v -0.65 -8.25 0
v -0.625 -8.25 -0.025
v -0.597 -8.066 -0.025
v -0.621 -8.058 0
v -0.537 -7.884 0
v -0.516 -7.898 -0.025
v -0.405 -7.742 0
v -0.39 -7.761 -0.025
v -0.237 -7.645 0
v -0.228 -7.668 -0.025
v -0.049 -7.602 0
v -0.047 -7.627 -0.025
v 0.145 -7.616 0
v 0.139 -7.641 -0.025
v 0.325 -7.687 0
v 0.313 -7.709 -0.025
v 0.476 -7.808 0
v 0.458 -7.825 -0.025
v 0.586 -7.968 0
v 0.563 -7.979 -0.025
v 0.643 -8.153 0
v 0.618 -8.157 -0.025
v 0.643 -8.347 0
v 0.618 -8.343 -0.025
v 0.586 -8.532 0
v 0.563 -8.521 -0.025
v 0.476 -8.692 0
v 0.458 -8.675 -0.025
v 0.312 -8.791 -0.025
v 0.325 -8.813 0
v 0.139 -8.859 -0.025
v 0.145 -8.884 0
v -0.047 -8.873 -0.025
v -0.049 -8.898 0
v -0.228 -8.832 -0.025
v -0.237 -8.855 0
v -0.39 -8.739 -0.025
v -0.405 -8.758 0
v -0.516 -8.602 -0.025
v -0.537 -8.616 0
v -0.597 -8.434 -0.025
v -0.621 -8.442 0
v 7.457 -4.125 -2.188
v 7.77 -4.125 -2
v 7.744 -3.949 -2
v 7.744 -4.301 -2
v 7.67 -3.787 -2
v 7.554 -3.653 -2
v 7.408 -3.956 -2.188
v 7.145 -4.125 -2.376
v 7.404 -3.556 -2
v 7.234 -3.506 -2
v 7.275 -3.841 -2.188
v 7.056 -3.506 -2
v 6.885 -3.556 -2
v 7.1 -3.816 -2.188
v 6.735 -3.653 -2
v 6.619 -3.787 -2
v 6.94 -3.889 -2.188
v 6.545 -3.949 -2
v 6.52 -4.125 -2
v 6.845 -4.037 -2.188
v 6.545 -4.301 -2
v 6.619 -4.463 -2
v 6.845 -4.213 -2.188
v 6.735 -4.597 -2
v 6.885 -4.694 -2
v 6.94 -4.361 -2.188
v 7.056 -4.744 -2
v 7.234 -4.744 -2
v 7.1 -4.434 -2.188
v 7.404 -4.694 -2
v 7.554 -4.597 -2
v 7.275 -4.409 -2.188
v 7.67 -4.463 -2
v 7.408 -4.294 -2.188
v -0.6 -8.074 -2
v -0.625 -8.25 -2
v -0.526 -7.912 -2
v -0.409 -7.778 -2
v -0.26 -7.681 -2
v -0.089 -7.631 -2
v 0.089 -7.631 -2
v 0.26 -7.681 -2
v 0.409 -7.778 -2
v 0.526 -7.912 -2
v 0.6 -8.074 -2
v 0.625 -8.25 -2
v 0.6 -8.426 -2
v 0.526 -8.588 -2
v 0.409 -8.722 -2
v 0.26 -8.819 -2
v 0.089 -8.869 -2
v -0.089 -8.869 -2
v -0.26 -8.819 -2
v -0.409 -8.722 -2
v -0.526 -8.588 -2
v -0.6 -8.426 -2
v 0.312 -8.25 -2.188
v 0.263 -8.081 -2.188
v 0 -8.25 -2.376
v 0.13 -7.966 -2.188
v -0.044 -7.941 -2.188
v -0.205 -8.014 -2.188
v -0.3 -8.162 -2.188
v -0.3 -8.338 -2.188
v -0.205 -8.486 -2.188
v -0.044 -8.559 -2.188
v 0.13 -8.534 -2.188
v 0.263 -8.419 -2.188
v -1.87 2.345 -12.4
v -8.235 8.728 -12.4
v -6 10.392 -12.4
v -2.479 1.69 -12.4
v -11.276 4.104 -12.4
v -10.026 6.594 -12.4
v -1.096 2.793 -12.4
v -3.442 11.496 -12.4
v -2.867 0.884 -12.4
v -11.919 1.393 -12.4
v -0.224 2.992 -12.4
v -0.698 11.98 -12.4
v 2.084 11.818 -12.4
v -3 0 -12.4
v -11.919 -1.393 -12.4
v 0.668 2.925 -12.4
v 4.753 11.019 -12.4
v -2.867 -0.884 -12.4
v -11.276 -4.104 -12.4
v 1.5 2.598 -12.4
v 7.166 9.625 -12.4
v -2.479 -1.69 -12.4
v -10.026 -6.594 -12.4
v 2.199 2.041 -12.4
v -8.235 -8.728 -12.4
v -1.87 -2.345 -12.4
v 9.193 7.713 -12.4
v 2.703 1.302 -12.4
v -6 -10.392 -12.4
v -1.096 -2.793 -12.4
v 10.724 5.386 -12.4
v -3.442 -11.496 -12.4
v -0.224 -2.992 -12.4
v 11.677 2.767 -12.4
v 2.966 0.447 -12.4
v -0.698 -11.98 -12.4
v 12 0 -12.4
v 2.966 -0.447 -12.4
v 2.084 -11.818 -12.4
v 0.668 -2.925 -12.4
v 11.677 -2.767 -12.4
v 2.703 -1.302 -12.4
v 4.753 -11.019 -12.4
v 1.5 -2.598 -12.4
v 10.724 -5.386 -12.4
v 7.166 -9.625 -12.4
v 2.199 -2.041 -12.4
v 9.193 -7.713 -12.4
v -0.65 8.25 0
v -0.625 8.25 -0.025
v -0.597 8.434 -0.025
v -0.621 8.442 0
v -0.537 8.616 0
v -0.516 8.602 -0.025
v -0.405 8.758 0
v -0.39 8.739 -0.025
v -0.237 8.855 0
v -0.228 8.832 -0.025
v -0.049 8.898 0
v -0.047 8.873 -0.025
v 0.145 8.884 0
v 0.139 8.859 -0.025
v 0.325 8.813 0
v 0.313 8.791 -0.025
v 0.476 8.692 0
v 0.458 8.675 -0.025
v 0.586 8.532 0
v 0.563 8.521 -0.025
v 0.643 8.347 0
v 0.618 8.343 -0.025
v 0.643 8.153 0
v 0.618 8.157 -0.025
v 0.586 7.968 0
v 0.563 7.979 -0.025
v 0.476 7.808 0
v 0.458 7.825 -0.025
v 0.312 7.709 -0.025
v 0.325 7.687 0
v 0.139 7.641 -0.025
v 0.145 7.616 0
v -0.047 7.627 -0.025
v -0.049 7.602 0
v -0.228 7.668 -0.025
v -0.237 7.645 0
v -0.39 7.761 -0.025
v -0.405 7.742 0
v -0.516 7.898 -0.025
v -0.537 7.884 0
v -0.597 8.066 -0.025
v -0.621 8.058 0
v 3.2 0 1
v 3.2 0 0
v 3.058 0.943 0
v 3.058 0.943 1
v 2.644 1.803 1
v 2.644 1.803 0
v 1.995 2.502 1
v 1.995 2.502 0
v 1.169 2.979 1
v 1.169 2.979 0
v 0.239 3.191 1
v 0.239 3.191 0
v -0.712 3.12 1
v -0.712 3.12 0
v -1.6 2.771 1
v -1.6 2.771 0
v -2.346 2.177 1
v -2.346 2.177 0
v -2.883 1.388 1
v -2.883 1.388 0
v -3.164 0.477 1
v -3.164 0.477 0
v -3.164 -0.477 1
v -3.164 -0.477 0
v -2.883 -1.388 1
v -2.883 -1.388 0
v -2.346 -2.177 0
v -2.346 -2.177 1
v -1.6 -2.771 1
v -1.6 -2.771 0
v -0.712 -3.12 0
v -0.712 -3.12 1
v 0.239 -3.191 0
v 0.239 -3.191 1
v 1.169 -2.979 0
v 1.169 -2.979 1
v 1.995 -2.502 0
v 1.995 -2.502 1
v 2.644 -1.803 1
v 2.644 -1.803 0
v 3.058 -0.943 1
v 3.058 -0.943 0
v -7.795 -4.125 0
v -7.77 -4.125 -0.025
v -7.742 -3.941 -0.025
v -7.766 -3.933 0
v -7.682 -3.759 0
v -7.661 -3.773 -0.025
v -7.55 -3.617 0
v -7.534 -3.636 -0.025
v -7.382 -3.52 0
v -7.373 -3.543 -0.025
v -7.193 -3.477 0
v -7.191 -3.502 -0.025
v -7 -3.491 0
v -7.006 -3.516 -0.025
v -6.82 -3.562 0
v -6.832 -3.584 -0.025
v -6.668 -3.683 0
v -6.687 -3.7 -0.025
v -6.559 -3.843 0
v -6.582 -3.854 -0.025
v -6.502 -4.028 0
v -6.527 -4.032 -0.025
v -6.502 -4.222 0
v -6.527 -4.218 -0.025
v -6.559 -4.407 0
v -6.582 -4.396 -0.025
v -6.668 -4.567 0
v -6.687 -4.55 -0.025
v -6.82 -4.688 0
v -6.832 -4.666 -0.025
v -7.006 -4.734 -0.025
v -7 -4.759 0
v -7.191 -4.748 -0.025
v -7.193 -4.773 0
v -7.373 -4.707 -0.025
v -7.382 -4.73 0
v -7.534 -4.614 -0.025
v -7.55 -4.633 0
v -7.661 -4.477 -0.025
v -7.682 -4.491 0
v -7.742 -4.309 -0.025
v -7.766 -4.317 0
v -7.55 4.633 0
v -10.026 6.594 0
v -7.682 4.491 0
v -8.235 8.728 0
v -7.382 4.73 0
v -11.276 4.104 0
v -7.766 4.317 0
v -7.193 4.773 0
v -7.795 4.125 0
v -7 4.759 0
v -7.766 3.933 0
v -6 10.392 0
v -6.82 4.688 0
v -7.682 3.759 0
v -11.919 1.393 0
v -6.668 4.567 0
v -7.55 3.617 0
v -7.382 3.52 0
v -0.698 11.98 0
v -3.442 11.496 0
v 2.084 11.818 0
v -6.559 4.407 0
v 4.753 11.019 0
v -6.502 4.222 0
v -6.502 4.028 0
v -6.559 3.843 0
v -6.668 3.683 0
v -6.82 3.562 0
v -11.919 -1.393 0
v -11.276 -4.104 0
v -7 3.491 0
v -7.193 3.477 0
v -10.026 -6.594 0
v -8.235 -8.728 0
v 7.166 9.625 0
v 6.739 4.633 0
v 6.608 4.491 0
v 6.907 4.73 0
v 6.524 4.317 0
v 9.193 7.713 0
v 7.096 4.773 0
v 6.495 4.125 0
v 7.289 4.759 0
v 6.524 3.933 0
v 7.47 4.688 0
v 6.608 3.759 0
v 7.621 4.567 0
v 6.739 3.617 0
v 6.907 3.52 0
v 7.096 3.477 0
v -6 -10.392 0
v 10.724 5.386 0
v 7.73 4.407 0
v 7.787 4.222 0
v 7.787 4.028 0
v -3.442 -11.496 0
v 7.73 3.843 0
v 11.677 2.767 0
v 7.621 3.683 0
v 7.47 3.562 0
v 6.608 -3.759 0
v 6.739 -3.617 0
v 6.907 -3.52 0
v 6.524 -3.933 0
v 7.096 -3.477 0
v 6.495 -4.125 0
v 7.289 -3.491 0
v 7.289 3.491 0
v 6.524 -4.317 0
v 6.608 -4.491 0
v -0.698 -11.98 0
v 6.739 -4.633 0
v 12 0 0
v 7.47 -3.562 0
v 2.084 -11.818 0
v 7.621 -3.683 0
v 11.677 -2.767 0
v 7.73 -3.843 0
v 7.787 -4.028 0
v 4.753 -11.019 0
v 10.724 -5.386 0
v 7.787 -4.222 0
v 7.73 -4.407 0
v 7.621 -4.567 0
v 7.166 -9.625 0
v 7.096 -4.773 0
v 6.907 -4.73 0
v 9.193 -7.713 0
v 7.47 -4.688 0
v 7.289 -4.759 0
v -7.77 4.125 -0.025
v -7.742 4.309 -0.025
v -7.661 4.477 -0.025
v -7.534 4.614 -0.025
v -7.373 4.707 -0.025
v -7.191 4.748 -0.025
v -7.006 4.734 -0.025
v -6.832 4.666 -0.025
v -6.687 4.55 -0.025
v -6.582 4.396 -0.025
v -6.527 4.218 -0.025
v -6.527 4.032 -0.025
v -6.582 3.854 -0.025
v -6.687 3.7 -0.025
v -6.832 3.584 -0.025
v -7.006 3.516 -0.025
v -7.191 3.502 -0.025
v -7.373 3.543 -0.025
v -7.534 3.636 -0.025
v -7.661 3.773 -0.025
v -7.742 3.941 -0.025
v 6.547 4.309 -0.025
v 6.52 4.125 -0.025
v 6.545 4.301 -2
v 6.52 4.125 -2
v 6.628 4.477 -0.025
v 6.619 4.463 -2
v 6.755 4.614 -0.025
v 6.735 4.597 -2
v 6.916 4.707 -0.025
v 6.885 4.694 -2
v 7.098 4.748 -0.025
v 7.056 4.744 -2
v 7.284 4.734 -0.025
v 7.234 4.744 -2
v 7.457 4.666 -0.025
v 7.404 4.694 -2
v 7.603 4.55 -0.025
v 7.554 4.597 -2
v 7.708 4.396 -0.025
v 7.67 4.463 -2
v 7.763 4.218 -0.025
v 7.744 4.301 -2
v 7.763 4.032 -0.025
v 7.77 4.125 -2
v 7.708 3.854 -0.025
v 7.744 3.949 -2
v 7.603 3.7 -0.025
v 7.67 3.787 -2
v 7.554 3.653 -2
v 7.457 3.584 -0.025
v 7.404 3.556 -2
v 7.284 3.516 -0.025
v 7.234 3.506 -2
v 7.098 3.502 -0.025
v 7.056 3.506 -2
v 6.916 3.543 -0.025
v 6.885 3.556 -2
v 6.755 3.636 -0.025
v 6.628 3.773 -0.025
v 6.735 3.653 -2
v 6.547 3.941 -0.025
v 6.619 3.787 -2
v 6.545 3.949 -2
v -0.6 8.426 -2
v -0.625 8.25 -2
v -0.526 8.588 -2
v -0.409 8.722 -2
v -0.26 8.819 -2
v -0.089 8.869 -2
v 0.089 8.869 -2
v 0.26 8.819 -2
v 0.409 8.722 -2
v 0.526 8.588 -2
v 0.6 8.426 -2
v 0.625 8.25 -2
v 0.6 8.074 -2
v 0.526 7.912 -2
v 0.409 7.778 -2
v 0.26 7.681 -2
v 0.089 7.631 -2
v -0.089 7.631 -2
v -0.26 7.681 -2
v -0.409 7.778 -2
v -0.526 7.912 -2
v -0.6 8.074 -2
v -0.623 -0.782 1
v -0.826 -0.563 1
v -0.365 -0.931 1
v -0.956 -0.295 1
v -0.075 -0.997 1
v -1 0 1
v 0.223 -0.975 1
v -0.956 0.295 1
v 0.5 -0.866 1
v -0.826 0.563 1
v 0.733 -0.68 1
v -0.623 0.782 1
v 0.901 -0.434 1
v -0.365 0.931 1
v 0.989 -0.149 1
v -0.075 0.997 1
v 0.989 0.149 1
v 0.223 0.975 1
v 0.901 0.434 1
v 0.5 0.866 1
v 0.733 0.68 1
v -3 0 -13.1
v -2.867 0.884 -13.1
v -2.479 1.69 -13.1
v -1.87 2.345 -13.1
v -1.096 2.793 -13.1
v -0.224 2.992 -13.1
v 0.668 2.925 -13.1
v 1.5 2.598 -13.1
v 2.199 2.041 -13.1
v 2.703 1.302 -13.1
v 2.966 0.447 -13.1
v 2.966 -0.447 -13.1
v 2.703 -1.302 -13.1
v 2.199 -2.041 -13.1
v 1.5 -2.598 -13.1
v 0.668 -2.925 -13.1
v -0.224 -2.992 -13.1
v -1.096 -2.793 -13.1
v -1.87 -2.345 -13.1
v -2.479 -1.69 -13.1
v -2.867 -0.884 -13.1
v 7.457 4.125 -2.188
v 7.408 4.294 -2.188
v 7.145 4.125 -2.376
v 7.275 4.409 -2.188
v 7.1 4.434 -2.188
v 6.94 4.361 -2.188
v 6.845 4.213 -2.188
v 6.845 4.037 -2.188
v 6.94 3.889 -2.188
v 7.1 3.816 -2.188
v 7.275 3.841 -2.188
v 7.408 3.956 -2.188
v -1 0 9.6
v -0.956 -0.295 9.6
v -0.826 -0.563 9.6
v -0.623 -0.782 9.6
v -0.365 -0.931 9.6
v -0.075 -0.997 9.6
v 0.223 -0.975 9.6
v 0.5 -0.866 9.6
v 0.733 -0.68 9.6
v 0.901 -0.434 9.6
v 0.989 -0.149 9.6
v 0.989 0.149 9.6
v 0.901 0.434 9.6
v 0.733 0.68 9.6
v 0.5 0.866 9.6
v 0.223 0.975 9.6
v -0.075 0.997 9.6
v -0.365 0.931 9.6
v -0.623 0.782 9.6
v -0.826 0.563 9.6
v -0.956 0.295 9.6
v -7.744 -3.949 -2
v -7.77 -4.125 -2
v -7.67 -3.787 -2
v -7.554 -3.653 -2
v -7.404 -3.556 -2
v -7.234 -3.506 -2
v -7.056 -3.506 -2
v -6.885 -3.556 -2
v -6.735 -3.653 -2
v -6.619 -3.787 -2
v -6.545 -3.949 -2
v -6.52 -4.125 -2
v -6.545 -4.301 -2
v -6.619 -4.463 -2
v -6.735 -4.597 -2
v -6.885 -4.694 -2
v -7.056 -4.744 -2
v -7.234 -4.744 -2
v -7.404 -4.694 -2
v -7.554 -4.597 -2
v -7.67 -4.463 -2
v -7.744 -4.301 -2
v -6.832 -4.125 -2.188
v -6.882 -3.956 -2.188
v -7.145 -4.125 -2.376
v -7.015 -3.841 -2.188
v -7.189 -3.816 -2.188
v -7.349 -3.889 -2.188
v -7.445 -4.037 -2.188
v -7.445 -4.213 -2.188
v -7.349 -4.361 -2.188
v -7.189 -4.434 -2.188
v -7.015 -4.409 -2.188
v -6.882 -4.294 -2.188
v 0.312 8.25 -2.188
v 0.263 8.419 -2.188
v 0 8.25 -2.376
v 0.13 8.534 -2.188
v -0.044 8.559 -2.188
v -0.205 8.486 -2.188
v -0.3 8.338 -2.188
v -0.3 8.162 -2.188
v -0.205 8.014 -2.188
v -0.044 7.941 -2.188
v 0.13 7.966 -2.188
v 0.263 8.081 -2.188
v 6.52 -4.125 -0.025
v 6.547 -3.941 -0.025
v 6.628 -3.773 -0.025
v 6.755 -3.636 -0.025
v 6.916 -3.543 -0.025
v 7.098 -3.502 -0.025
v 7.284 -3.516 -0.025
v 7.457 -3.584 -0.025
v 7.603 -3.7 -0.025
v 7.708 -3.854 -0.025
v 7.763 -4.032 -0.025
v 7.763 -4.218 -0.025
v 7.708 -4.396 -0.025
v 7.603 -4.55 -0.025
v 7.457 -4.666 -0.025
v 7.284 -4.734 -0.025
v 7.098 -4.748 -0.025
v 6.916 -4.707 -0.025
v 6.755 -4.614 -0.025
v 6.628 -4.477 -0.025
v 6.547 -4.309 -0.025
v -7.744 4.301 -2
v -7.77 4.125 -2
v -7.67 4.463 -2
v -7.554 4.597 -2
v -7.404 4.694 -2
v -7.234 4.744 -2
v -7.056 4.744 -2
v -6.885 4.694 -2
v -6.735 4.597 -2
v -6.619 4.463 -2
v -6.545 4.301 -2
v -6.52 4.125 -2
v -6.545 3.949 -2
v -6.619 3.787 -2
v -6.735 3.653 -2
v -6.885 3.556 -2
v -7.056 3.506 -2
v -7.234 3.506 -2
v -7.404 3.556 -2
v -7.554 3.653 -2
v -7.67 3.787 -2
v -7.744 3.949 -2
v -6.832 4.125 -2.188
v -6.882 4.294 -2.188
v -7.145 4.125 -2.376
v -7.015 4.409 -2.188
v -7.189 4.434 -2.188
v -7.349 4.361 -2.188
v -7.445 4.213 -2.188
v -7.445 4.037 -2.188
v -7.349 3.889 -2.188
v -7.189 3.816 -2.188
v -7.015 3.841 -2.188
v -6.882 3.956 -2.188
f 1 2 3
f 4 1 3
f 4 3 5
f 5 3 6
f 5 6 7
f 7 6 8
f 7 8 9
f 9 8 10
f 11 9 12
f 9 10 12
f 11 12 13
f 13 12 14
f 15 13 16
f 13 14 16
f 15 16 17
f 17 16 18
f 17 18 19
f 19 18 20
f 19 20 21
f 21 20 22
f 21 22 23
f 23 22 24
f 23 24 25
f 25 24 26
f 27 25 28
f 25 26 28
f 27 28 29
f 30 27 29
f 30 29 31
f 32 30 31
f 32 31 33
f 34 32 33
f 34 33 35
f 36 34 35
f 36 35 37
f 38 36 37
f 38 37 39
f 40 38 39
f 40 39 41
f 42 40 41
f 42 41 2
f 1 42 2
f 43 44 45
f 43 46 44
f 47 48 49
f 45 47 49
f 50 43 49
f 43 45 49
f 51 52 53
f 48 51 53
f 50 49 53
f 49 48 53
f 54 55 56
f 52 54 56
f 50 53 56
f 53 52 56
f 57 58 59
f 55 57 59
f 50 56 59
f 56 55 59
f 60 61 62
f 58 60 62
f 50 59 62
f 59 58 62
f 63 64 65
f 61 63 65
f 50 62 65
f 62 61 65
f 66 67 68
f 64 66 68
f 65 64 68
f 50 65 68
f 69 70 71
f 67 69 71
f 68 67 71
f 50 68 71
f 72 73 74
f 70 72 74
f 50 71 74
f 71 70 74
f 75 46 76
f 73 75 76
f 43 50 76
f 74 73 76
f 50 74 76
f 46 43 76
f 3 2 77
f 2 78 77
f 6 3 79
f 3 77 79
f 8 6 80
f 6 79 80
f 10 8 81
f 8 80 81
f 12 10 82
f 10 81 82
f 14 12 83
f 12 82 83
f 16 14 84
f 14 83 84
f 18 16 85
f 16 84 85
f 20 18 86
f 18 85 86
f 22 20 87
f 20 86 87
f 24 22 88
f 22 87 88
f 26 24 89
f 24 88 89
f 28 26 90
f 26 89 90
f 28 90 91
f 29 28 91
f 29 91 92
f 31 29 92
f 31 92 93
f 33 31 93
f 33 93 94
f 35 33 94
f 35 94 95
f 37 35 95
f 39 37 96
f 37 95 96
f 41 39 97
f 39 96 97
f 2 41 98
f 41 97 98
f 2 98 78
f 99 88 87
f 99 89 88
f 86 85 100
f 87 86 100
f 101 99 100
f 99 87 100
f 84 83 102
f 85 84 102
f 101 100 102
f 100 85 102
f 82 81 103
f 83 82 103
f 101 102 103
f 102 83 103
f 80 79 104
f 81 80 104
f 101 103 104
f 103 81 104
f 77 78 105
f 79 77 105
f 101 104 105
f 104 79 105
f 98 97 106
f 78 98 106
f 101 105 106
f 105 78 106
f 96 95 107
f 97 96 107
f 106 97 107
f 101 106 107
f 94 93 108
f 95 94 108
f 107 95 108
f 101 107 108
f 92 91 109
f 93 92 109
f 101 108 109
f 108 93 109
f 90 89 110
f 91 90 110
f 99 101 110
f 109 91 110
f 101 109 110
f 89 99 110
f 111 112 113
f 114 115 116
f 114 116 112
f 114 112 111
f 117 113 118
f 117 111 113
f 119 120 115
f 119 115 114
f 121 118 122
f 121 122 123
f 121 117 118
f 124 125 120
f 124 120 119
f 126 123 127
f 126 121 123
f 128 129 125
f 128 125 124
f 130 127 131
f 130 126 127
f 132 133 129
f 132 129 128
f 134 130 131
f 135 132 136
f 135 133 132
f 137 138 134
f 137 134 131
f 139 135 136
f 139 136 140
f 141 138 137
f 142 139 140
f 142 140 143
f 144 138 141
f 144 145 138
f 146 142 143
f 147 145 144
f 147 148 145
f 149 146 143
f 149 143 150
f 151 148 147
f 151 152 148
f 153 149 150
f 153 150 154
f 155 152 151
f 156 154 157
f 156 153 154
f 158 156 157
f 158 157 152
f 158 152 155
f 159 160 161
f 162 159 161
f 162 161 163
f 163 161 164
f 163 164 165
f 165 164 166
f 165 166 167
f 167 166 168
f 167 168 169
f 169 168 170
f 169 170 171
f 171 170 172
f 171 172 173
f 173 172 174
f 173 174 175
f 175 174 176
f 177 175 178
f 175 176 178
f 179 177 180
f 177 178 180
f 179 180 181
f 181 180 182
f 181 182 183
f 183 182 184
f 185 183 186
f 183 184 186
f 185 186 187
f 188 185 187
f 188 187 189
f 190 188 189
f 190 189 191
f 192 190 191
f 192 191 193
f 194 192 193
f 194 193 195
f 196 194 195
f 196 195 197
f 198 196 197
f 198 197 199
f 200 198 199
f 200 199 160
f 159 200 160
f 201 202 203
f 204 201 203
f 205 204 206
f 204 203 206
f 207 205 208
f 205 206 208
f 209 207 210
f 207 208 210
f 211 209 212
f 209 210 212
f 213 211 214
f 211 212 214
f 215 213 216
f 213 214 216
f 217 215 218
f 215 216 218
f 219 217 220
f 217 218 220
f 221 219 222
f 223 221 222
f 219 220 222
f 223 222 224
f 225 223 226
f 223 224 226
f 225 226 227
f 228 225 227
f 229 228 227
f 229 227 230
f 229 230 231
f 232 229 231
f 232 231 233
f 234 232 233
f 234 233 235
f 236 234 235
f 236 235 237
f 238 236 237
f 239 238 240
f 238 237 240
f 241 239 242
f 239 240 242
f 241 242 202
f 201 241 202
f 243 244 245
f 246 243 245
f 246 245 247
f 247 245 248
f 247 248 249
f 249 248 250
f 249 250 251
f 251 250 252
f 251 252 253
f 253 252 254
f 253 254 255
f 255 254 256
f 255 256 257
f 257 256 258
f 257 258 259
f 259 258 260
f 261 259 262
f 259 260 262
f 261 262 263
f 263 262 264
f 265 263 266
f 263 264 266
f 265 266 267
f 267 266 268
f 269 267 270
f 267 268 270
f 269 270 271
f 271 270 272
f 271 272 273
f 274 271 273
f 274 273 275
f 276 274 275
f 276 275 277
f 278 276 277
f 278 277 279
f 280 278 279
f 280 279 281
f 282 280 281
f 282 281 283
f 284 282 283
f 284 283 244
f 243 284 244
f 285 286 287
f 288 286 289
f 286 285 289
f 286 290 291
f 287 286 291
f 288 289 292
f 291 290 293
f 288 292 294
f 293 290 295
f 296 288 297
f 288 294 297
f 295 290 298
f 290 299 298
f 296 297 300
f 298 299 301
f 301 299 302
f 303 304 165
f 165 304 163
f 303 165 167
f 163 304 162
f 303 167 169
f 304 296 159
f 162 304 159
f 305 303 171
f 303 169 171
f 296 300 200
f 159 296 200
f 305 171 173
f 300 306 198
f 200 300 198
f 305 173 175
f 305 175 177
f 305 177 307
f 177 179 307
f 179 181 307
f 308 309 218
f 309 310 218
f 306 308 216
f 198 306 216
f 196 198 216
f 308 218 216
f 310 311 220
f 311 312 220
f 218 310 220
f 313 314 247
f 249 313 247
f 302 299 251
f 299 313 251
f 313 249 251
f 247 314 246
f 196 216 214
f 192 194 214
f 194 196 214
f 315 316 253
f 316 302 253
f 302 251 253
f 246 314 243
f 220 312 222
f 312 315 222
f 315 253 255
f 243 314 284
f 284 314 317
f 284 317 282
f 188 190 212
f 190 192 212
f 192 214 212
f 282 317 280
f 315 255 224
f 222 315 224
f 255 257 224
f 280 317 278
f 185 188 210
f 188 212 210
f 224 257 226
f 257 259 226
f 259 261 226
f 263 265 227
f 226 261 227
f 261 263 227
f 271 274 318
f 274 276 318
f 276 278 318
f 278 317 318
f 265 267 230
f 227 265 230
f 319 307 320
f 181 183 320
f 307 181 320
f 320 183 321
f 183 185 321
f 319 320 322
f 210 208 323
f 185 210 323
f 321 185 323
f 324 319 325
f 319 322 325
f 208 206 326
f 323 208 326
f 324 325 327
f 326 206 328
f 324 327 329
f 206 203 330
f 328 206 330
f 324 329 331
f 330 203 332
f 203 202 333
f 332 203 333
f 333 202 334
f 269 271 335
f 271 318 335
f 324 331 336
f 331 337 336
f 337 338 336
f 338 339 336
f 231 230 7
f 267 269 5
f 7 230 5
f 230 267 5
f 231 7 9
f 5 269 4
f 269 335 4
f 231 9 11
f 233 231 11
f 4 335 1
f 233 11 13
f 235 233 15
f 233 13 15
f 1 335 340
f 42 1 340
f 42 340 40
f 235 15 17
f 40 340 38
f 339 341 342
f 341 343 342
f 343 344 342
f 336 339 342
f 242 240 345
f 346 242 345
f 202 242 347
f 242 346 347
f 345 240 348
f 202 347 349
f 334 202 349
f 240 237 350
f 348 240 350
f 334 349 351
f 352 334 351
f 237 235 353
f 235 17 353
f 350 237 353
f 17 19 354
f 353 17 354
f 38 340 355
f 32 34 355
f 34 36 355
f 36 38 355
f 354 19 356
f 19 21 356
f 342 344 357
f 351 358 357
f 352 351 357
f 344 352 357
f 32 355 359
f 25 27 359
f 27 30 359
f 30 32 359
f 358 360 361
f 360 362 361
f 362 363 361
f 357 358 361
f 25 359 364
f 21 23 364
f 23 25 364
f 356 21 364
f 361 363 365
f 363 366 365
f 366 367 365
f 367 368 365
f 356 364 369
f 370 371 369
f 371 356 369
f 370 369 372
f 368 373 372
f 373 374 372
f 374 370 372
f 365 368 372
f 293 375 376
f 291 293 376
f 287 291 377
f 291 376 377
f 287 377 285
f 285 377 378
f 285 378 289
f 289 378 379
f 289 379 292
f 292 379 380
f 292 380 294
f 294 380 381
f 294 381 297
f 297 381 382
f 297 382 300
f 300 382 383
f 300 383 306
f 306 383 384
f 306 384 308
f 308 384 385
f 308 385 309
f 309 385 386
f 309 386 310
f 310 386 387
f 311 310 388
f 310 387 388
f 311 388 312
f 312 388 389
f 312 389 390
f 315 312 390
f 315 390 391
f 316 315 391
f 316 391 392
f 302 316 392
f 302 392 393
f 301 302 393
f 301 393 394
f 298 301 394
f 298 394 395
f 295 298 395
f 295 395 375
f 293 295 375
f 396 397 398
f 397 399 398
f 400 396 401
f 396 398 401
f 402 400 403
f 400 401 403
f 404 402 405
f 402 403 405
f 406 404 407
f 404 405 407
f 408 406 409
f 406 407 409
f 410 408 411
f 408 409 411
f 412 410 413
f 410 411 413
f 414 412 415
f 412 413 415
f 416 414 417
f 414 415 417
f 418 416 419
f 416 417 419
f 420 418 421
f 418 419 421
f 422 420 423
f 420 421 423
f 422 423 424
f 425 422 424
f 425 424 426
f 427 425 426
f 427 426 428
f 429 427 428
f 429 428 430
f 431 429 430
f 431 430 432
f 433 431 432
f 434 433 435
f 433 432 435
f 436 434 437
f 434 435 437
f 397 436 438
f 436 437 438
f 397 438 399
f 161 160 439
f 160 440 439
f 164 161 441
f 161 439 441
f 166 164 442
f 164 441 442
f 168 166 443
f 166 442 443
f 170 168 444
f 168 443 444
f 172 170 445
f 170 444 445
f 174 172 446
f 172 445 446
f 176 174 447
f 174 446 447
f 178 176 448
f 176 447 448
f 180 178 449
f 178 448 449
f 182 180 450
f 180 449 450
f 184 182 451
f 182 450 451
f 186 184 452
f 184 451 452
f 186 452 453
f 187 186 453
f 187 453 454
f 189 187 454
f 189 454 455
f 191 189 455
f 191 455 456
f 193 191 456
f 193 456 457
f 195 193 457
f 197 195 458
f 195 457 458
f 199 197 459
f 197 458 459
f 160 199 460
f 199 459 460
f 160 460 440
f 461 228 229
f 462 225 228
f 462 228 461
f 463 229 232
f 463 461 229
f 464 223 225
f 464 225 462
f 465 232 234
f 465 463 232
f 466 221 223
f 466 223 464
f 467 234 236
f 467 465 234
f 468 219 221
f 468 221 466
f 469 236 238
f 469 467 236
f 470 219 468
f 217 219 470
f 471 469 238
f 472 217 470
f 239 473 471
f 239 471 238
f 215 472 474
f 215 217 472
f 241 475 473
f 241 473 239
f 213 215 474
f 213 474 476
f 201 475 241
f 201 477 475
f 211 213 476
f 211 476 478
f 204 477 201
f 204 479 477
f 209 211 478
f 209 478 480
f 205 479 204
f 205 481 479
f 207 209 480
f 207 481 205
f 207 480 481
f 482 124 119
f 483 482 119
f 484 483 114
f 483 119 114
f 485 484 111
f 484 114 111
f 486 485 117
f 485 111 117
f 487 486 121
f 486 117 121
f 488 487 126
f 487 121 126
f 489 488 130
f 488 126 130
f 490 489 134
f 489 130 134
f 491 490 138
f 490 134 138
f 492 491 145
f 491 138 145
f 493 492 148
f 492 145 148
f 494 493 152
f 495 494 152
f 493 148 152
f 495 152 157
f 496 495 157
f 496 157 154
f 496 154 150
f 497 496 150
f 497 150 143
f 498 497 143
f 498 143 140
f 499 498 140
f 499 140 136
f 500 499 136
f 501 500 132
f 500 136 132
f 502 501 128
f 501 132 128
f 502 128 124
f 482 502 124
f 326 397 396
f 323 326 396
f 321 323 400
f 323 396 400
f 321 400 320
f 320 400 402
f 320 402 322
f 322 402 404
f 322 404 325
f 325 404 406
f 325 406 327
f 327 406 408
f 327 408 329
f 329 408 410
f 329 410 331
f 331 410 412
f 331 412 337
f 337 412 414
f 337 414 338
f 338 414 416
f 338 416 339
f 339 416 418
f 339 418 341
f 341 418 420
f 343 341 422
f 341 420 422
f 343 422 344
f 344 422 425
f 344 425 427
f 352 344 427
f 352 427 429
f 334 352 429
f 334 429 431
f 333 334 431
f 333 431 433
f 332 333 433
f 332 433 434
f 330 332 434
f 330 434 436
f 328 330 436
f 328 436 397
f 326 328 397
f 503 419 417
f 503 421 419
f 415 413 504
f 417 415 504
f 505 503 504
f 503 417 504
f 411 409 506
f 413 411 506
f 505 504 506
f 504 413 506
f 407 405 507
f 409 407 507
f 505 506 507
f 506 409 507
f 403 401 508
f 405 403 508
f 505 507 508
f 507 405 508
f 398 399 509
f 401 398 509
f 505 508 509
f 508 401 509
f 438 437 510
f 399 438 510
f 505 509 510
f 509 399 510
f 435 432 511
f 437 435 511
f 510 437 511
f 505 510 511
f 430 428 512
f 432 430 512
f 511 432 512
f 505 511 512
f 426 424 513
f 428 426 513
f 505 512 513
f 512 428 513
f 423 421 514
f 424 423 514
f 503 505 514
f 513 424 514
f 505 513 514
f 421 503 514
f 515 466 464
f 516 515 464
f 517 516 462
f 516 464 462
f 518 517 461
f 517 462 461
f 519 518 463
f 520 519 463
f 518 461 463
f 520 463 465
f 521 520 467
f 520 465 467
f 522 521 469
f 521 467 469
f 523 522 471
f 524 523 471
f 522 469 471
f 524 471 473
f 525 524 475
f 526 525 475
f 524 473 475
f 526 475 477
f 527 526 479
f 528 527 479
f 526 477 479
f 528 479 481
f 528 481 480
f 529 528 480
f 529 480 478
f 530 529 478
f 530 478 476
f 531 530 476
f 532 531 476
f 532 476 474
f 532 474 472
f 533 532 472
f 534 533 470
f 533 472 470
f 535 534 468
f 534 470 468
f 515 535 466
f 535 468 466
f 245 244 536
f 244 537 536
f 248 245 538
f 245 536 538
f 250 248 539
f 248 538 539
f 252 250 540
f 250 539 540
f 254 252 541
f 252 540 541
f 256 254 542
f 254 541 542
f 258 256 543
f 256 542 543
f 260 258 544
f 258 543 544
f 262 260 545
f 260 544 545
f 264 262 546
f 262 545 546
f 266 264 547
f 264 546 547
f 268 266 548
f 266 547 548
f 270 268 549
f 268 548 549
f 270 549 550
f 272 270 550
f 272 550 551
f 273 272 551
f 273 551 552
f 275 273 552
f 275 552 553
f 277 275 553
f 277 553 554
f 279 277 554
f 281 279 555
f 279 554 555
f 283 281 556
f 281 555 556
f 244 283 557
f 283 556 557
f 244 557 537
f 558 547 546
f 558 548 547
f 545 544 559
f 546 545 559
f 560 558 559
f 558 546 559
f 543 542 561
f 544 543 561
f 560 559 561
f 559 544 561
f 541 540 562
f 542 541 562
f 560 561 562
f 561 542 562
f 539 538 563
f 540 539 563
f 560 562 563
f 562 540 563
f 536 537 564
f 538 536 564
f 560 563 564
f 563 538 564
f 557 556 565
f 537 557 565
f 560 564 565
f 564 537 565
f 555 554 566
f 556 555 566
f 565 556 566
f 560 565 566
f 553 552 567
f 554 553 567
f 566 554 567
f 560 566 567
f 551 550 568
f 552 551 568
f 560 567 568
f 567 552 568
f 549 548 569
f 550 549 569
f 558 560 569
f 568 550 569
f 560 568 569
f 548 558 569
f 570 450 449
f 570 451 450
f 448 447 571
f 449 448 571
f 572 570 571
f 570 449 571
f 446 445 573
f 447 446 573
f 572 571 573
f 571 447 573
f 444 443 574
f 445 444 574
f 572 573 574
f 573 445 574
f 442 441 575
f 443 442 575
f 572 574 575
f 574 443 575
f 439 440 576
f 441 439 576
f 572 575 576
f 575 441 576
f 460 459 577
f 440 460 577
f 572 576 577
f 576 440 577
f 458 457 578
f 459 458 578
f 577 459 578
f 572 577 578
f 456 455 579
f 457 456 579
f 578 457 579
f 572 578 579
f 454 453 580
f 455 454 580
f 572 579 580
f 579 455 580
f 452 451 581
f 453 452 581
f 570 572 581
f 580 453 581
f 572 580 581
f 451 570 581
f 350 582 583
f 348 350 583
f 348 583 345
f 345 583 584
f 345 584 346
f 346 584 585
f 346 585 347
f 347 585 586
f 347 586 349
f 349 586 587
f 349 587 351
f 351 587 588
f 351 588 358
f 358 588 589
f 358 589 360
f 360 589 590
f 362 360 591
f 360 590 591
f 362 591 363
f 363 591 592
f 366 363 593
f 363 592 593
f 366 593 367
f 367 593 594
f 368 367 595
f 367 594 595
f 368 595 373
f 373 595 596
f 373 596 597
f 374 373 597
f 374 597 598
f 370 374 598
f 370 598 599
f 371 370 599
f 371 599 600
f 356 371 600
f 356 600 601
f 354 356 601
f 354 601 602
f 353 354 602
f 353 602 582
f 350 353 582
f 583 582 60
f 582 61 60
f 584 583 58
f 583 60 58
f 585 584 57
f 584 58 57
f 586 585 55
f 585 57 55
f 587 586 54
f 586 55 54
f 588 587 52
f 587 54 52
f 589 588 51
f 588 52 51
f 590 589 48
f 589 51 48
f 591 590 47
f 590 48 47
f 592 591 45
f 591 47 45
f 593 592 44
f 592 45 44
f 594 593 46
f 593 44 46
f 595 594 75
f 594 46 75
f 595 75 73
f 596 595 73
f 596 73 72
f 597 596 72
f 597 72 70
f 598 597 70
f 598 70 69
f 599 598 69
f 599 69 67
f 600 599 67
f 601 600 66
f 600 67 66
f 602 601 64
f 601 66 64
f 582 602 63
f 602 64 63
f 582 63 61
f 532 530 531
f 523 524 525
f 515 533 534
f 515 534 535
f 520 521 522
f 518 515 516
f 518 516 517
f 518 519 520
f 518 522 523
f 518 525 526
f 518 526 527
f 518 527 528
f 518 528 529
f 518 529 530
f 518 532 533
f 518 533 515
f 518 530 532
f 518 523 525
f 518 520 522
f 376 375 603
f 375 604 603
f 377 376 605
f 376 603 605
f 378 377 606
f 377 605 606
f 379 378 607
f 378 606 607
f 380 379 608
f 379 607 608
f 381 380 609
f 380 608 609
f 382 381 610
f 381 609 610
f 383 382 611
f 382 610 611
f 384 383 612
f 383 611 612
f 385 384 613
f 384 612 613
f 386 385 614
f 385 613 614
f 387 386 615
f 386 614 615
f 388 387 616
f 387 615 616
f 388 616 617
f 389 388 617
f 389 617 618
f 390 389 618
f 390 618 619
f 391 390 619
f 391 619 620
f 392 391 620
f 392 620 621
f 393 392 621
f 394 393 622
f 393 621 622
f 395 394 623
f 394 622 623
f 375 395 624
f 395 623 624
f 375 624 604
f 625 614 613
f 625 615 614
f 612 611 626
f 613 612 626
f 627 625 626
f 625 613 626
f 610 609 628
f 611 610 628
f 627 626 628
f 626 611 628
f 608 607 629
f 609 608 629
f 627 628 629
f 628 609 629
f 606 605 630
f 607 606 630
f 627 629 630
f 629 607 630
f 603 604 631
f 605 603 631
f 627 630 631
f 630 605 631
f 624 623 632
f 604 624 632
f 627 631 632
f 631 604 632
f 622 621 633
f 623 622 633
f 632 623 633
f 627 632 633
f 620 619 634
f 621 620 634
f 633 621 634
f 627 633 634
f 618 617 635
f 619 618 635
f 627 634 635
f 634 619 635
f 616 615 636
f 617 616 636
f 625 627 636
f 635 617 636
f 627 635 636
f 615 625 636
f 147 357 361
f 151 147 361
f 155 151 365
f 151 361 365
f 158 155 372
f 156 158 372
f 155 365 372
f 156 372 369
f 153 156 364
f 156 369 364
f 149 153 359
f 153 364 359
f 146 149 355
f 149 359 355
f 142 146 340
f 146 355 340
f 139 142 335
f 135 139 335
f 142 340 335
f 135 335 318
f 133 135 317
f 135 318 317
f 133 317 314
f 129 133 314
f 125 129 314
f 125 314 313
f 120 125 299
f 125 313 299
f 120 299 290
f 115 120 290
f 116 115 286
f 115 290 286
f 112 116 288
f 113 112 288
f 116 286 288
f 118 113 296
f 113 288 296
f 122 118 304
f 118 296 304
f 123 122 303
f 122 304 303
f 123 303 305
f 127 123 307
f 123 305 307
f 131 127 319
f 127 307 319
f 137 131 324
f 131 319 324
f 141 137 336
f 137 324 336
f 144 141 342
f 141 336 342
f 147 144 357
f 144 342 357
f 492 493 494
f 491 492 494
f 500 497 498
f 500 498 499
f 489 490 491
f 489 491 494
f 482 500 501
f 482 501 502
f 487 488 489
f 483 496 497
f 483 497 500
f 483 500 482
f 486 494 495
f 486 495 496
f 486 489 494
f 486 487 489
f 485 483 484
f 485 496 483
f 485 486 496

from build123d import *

# Parameters (mm, degrees)
SKETCH_2_R                     = 12
EXTRUDE_2_DEPTH                = 12.4
SKETCH_5_R                     = 3.2
EXTRUDE_4_DEPTH                = 1
SKETCH_3_R                     = 1
EXTRUDE_3_DEPTH                = 8.6
SKETCH_6_R                     = 3
EXTRUDE_5_DEPTH                = 0.7
HOLE_WIZARD_M1_6_1_D           = 1.25
HOLE_WIZARD_M1_6_1_DEPTH       = 2
HOLE_WIZARD_M1_6_1_CSINK_D     = 1.3
HOLE_WIZARD_M1_6_1_CSINK_ANGLE = 90
HOLE_WIZARD_M1_6_1_TIP         = 0.375537887


with BuildPart() as part:
    # 草圖2 → 填料-伸長2 (new body)
    with BuildSketch(Plane(origin=(0, 0, 0), x_dir=(-1, 0, 0), z_dir=(0, 0, -1))):
        with Locations(Location((0, 0, 0), (0, 0, 180))):
            Circle(SKETCH_2_R)
    extrude(amount=EXTRUDE_2_DEPTH)

    # 草圖5 → 填料-伸長4 (add)
    with BuildSketch(Plane.XY):
        Circle(SKETCH_5_R)
    extrude(amount=EXTRUDE_4_DEPTH)

    # 草圖3 → 填料-伸長3 (add)
    with BuildSketch(Plane.XY.offset(1)):
        with Locations(Location((0, 0, 0), (0, 0, 180))):
            Circle(SKETCH_3_R)
    extrude(amount=EXTRUDE_3_DEPTH)

    # 草圖6 → 填料-伸長5 (add)
    with BuildSketch(Plane(origin=(0, 0, -12.4), x_dir=(-1, 0, 0), z_dir=(0, 0, -1))):
        Circle(SKETCH_6_R)
    extrude(amount=EXTRUDE_5_DEPTH)

    # M1.6  螺絲攻的螺孔鑽1
    with Locations(Plane.XY):
        with Locations((0, 8.25), (7.144709581, 4.125), (7.144709581, -4.125), (0, -8.25), (-7.144709581, -4.125), (-7.144709581, 4.125)):
            CounterSinkHole(HOLE_WIZARD_M1_6_1_D / 2, HOLE_WIZARD_M1_6_1_CSINK_D / 2, depth=HOLE_WIZARD_M1_6_1_DEPTH, counter_sink_angle=HOLE_WIZARD_M1_6_1_CSINK_ANGLE)
            with Locations((0, 0, -(HOLE_WIZARD_M1_6_1_DEPTH + HOLE_WIZARD_M1_6_1_TIP / 2))):  # 118° drill point
                Cone(0, HOLE_WIZARD_M1_6_1_D / 2, HOLE_WIZARD_M1_6_1_TIP, mode=Mode.SUBTRACT)


solid = part.part
